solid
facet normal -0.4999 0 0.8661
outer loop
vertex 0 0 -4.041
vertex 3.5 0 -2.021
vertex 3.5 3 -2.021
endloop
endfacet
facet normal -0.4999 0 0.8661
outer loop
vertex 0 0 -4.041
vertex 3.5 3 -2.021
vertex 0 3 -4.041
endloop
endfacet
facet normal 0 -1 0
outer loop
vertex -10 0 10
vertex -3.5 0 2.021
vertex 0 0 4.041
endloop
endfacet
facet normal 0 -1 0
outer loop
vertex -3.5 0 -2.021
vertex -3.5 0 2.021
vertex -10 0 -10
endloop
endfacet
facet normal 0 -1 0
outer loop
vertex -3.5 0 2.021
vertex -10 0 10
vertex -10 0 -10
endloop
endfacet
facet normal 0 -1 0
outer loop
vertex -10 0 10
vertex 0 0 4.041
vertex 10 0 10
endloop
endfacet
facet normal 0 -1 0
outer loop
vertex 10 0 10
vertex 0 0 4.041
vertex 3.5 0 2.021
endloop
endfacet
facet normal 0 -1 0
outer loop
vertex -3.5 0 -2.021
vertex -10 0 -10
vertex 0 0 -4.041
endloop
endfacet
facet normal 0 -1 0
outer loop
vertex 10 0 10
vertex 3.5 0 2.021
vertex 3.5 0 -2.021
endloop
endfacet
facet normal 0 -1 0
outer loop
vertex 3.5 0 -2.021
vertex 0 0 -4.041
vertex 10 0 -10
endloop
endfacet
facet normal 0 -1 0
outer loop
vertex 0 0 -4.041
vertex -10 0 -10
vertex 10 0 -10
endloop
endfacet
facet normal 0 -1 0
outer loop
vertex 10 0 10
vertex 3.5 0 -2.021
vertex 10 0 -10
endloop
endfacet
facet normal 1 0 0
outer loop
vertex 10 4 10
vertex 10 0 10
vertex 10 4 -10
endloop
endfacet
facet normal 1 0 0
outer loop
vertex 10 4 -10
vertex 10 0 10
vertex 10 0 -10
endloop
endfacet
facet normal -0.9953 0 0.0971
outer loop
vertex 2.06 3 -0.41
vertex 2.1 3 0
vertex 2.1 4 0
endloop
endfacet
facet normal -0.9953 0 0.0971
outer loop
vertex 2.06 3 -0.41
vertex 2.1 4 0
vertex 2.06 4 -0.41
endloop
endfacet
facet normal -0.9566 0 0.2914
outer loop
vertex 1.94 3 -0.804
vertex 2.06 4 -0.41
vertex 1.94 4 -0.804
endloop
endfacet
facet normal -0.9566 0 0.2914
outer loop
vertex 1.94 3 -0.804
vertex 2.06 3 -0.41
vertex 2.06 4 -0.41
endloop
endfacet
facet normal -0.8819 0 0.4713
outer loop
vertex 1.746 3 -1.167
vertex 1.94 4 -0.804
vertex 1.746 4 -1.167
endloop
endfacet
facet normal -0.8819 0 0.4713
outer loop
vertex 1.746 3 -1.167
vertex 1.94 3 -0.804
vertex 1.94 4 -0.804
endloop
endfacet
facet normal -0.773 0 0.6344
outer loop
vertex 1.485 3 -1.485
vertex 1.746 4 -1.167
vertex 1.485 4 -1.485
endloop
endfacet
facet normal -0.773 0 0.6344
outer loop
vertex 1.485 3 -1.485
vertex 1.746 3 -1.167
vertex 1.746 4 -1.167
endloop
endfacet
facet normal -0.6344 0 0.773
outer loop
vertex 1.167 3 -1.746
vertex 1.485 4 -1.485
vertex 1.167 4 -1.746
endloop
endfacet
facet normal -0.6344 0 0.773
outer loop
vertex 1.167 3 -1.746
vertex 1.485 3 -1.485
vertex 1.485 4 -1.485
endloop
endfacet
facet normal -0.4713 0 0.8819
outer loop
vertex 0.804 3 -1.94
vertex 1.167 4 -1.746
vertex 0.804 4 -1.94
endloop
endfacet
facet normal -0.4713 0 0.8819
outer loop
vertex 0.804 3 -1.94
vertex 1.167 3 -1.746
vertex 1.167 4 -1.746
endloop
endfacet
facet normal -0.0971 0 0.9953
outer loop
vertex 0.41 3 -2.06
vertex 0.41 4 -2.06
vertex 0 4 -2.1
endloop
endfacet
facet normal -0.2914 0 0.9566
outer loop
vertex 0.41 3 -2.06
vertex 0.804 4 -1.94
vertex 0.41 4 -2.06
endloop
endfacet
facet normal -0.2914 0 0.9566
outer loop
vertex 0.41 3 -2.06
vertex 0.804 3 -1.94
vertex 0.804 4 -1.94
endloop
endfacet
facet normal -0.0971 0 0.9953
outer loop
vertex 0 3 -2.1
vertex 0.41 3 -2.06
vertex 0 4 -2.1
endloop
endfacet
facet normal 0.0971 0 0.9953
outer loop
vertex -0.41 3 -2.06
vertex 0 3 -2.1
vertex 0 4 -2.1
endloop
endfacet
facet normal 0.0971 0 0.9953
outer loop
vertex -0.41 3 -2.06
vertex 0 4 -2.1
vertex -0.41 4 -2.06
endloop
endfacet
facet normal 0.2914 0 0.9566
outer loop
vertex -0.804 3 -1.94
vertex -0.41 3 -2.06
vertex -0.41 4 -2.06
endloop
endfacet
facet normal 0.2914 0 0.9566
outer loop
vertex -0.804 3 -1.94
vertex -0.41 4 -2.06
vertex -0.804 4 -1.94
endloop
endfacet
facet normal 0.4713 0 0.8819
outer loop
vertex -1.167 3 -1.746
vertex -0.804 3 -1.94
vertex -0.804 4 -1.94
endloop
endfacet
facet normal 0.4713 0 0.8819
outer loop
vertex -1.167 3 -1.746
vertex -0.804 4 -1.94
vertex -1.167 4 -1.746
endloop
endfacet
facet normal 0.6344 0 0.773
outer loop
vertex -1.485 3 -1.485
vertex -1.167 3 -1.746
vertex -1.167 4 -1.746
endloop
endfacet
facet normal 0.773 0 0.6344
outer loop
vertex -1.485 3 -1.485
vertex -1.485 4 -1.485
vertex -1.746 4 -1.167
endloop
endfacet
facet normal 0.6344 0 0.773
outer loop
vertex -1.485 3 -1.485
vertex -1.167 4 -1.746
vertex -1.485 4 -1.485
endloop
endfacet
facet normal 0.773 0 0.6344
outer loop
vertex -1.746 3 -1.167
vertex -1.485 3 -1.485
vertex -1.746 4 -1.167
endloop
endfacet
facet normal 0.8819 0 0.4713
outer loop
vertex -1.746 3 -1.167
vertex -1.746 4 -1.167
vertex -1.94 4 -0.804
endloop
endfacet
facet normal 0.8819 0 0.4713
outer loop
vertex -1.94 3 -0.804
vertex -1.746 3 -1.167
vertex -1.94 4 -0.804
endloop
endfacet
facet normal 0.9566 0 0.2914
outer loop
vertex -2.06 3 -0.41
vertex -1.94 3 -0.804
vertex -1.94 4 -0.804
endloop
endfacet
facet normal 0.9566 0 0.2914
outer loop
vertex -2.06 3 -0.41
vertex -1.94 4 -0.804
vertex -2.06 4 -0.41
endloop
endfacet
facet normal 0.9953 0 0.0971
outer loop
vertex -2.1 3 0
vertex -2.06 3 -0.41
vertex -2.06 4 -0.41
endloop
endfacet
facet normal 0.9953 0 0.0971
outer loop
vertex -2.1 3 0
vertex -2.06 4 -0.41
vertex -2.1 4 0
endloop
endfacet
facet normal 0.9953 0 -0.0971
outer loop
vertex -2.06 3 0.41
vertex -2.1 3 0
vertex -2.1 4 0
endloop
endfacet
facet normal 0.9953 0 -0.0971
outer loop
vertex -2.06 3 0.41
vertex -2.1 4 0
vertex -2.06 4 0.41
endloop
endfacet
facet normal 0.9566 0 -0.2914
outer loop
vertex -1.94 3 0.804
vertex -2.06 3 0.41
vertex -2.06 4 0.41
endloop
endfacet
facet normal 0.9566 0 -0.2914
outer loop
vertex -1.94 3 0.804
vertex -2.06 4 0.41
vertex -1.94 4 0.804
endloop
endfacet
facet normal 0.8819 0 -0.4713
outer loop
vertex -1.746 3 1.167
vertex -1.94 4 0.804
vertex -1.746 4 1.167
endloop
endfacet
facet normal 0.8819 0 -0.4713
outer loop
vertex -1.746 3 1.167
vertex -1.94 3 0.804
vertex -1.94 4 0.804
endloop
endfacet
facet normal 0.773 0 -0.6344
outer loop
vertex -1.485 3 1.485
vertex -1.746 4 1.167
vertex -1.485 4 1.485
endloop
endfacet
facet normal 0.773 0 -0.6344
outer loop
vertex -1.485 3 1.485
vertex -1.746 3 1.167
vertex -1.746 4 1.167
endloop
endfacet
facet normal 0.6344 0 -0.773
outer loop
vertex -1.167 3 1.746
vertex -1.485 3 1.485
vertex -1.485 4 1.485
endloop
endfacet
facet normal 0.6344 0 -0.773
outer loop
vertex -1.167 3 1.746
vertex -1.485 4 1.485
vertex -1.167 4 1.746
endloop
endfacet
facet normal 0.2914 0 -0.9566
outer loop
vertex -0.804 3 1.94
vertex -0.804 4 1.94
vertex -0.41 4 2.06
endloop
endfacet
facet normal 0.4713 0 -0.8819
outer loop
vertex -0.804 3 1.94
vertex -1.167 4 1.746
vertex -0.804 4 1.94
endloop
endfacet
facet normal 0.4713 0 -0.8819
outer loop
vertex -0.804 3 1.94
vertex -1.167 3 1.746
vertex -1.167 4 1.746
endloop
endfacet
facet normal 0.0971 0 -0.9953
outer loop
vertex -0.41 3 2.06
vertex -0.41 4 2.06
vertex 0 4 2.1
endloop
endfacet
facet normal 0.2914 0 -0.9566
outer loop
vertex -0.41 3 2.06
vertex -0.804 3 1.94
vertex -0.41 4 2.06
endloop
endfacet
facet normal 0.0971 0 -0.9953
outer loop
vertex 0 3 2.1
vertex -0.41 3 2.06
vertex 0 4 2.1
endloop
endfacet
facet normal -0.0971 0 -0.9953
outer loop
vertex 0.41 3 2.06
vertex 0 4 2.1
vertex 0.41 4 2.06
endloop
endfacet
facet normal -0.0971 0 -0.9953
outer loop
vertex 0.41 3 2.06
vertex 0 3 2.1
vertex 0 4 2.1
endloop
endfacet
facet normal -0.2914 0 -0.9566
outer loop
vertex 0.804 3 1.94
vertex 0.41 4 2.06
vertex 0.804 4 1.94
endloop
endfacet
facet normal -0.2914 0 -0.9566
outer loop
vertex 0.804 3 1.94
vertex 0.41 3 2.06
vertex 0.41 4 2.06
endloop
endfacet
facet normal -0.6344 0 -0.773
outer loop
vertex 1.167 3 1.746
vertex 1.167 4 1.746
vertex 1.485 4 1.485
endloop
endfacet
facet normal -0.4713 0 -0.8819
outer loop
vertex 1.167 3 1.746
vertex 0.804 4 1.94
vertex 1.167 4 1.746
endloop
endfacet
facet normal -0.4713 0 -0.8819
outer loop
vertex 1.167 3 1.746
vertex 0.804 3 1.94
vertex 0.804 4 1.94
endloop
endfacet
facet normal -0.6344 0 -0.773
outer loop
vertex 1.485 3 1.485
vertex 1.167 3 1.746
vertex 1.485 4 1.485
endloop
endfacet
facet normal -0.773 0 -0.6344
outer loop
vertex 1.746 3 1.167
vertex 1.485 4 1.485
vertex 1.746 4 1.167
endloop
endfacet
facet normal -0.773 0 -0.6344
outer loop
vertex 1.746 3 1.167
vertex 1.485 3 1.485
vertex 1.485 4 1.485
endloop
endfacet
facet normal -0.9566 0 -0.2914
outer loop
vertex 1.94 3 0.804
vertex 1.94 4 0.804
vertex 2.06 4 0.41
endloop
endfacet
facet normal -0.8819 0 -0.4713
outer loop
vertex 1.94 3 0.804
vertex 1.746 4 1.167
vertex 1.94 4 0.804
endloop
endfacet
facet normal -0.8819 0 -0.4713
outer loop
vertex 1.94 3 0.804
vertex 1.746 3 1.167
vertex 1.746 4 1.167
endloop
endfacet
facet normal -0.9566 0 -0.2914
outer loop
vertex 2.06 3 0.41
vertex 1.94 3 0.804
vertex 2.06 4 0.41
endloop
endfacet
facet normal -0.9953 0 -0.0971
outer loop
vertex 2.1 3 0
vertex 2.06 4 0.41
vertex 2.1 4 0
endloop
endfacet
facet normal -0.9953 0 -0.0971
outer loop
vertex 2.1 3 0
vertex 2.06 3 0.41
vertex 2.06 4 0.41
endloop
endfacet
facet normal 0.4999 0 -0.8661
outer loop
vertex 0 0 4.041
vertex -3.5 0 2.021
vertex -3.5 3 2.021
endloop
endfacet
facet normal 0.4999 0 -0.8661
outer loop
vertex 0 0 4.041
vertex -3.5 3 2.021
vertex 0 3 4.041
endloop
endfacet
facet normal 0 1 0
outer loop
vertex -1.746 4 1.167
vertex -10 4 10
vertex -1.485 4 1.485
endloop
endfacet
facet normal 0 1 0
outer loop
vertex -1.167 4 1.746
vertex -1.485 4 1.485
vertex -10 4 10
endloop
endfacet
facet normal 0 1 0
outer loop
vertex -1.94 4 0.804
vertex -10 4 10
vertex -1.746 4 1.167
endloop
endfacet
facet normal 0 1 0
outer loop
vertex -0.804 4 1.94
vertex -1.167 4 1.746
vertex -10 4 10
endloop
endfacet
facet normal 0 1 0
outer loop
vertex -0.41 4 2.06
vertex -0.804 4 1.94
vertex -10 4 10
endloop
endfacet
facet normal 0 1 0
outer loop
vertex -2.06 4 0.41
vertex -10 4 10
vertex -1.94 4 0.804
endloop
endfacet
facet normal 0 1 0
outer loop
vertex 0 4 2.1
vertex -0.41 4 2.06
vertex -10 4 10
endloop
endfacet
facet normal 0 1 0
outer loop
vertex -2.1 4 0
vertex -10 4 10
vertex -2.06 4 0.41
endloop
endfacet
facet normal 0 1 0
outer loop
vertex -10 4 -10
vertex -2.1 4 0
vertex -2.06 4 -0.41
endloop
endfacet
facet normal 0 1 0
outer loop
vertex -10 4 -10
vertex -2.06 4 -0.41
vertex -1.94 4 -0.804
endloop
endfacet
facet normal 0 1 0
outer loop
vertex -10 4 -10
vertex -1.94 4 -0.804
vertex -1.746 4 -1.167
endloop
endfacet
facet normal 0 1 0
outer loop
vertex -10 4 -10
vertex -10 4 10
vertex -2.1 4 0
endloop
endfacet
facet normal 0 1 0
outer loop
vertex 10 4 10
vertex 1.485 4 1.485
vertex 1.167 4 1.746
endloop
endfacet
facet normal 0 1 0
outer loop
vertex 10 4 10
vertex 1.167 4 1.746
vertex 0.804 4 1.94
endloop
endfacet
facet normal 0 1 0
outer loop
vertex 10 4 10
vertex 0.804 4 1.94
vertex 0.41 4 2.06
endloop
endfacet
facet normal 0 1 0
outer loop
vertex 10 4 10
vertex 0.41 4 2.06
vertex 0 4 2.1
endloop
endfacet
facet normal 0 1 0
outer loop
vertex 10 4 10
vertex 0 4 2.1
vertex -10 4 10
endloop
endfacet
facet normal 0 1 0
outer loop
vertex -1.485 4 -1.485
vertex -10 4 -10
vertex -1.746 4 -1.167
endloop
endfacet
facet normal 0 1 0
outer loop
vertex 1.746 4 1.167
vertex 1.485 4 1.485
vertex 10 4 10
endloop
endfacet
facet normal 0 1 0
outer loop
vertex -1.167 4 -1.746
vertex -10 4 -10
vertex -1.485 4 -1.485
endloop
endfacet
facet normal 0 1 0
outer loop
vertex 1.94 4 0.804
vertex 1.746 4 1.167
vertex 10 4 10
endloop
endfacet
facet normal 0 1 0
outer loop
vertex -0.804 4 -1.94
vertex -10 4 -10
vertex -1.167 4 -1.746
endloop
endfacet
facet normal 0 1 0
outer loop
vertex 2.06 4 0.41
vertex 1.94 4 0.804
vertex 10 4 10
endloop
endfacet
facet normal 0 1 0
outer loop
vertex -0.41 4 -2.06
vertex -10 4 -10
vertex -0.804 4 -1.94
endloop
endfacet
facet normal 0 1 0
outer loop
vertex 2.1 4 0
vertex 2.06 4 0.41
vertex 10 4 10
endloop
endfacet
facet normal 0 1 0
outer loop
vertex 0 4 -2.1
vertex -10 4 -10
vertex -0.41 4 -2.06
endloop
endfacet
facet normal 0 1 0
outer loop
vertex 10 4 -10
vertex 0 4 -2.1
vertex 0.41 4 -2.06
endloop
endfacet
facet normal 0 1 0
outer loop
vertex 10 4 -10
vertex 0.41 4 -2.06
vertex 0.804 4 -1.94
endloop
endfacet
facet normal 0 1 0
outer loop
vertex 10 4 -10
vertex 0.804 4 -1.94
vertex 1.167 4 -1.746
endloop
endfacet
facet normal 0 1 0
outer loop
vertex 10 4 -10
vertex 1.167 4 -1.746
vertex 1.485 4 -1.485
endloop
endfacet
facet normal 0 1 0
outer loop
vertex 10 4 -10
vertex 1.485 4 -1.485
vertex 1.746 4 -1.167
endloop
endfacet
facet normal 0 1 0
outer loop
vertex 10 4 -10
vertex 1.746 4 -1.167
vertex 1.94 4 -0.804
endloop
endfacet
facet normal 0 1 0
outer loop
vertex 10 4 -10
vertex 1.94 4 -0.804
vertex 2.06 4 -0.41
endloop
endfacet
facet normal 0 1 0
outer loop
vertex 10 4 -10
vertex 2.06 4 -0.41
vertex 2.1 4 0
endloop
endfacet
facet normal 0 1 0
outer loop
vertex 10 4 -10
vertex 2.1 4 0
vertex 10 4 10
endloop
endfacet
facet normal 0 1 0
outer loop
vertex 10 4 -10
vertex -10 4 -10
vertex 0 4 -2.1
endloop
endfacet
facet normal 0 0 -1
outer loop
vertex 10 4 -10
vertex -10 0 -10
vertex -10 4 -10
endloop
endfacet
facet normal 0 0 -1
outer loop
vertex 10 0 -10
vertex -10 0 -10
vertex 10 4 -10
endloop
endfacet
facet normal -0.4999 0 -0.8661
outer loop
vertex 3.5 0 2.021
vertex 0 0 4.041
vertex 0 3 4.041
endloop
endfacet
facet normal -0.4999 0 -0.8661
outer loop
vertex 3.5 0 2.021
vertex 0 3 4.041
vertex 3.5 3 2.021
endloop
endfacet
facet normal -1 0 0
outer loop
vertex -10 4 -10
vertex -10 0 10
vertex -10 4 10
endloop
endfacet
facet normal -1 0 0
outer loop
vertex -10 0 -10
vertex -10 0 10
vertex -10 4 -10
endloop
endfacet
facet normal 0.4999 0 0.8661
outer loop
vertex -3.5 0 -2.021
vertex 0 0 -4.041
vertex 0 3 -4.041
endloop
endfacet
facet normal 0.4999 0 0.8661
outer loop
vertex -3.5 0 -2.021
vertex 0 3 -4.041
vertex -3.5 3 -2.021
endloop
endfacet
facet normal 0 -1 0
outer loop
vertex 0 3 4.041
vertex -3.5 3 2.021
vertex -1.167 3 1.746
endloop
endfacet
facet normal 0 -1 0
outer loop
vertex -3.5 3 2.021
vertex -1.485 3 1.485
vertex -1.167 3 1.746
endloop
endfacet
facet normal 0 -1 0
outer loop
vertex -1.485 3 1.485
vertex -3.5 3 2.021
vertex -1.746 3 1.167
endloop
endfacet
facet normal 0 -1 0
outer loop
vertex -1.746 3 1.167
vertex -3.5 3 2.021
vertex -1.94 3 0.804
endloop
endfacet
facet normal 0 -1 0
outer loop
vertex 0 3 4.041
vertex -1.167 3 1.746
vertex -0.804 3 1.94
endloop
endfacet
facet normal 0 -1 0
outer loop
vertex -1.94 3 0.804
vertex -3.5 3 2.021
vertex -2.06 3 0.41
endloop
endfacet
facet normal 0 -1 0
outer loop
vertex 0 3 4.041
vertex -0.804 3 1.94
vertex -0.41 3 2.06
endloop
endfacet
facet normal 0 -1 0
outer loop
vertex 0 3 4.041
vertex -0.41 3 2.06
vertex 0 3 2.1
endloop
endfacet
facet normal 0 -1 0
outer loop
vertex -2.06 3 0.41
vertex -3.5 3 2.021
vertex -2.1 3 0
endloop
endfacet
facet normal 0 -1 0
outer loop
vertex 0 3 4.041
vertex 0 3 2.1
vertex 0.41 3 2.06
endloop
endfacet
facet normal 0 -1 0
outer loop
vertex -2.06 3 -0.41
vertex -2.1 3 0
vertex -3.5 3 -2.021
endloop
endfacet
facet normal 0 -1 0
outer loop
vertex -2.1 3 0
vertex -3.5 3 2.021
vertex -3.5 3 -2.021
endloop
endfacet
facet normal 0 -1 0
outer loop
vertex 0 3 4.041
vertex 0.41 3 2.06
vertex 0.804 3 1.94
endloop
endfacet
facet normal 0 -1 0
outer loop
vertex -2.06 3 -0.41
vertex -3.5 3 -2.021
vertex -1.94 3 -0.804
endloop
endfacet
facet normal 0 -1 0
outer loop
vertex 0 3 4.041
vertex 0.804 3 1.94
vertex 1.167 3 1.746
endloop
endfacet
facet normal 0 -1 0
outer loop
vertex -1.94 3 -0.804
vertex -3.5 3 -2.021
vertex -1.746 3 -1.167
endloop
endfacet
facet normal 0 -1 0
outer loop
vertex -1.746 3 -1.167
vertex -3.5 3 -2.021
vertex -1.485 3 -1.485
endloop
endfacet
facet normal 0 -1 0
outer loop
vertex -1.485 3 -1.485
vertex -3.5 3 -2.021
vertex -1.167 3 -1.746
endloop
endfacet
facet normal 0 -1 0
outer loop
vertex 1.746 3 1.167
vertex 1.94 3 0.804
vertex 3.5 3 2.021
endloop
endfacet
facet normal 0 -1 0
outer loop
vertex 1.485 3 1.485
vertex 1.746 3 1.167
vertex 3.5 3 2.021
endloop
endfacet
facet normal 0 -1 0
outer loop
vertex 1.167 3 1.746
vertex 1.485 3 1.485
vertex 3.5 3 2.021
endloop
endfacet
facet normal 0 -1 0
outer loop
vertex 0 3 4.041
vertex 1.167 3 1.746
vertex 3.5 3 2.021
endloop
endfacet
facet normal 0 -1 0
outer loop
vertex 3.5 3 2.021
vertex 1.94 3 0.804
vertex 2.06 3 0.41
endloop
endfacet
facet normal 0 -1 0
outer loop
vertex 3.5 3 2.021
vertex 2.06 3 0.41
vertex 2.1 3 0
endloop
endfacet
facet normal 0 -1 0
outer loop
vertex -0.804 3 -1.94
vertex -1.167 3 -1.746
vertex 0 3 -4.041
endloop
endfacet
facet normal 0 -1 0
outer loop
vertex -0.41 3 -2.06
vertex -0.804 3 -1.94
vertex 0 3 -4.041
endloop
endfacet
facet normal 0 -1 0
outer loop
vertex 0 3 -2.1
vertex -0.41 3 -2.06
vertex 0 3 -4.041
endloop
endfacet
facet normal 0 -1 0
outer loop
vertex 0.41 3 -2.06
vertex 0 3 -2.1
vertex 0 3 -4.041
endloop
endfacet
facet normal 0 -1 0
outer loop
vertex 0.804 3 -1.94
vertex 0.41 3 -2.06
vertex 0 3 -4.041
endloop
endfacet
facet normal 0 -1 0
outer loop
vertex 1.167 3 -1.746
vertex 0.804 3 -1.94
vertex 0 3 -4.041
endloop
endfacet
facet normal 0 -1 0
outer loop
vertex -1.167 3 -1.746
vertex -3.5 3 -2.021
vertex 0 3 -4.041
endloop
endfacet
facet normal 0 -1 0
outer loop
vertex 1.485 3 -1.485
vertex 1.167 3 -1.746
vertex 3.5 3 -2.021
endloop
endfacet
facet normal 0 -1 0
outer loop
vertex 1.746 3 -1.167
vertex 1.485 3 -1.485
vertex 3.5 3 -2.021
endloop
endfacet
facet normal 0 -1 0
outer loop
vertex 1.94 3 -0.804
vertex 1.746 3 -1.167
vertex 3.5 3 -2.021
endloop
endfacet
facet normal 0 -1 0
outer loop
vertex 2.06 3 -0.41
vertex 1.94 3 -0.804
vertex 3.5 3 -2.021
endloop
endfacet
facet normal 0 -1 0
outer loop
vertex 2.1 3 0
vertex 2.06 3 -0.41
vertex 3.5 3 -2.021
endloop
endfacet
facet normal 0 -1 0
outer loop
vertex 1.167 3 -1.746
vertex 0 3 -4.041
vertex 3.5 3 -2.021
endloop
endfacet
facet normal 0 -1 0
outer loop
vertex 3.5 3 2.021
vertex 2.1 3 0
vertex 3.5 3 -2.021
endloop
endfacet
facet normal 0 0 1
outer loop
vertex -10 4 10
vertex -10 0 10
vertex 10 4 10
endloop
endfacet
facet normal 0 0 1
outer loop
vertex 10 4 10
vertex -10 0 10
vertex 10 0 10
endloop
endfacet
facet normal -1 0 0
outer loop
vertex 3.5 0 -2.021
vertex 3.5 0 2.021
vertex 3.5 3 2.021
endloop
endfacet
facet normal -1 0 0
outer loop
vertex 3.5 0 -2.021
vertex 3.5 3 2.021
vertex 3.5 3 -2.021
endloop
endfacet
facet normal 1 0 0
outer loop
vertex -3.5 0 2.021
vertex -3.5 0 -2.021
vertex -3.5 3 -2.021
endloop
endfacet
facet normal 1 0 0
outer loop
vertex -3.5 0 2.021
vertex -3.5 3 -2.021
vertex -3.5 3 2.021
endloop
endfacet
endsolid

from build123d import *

# Parameters (mm, degrees)
SKETCH1_W               = 20
SKETCH1_H               = 20
BOSS_EXTRUDE1_DEPTH     = 4
CUT_EXTRUDE1_DEPTH      = 3
SKETCH1_4_R             = 2.1
CUT_EXTRUDE2_DEPTH      = 5
CUT_EXTRUDE2_DEPTH_BACK = 1


with BuildPart() as part:
    # Sketch1 → Boss-Extrude1 (new body)
    with BuildSketch(Plane(origin=(0, 0, 0), x_dir=(1, 0, 0), z_dir=(0, 1, 0))):
        Rectangle(SKETCH1_W, SKETCH1_H)
    extrude(amount=BOSS_EXTRUDE1_DEPTH)

    # Sketch1<3> → Cut-Extrude1 (cut)
    with BuildSketch(Plane(origin=(0, 0, 0), x_dir=(1, 0, 0), z_dir=(0, 1, 0))):
        Polygon((0, 4.041451884), (-3.5, 2.020725942), (-3.5, -2.020725942), (0, -4.041451884), (3.5, -2.020725942), (3.5, 2.020725942), align=None)
    extrude(amount=CUT_EXTRUDE1_DEPTH, mode=Mode.SUBTRACT)

    # Sketch1<4> → Cut-Extrude2 (cut, two sides)
    with BuildSketch(Plane(origin=(0, 0, 0), x_dir=(1, 0, 0), z_dir=(0, 1, 0))) as cut_extrude2_sk:
        Circle(SKETCH1_4_R)
    extrude(amount=CUT_EXTRUDE2_DEPTH, mode=Mode.SUBTRACT)
    extrude(cut_extrude2_sk.sketch, amount=-CUT_EXTRUDE2_DEPTH_BACK, mode=Mode.SUBTRACT)


solid = part.part
